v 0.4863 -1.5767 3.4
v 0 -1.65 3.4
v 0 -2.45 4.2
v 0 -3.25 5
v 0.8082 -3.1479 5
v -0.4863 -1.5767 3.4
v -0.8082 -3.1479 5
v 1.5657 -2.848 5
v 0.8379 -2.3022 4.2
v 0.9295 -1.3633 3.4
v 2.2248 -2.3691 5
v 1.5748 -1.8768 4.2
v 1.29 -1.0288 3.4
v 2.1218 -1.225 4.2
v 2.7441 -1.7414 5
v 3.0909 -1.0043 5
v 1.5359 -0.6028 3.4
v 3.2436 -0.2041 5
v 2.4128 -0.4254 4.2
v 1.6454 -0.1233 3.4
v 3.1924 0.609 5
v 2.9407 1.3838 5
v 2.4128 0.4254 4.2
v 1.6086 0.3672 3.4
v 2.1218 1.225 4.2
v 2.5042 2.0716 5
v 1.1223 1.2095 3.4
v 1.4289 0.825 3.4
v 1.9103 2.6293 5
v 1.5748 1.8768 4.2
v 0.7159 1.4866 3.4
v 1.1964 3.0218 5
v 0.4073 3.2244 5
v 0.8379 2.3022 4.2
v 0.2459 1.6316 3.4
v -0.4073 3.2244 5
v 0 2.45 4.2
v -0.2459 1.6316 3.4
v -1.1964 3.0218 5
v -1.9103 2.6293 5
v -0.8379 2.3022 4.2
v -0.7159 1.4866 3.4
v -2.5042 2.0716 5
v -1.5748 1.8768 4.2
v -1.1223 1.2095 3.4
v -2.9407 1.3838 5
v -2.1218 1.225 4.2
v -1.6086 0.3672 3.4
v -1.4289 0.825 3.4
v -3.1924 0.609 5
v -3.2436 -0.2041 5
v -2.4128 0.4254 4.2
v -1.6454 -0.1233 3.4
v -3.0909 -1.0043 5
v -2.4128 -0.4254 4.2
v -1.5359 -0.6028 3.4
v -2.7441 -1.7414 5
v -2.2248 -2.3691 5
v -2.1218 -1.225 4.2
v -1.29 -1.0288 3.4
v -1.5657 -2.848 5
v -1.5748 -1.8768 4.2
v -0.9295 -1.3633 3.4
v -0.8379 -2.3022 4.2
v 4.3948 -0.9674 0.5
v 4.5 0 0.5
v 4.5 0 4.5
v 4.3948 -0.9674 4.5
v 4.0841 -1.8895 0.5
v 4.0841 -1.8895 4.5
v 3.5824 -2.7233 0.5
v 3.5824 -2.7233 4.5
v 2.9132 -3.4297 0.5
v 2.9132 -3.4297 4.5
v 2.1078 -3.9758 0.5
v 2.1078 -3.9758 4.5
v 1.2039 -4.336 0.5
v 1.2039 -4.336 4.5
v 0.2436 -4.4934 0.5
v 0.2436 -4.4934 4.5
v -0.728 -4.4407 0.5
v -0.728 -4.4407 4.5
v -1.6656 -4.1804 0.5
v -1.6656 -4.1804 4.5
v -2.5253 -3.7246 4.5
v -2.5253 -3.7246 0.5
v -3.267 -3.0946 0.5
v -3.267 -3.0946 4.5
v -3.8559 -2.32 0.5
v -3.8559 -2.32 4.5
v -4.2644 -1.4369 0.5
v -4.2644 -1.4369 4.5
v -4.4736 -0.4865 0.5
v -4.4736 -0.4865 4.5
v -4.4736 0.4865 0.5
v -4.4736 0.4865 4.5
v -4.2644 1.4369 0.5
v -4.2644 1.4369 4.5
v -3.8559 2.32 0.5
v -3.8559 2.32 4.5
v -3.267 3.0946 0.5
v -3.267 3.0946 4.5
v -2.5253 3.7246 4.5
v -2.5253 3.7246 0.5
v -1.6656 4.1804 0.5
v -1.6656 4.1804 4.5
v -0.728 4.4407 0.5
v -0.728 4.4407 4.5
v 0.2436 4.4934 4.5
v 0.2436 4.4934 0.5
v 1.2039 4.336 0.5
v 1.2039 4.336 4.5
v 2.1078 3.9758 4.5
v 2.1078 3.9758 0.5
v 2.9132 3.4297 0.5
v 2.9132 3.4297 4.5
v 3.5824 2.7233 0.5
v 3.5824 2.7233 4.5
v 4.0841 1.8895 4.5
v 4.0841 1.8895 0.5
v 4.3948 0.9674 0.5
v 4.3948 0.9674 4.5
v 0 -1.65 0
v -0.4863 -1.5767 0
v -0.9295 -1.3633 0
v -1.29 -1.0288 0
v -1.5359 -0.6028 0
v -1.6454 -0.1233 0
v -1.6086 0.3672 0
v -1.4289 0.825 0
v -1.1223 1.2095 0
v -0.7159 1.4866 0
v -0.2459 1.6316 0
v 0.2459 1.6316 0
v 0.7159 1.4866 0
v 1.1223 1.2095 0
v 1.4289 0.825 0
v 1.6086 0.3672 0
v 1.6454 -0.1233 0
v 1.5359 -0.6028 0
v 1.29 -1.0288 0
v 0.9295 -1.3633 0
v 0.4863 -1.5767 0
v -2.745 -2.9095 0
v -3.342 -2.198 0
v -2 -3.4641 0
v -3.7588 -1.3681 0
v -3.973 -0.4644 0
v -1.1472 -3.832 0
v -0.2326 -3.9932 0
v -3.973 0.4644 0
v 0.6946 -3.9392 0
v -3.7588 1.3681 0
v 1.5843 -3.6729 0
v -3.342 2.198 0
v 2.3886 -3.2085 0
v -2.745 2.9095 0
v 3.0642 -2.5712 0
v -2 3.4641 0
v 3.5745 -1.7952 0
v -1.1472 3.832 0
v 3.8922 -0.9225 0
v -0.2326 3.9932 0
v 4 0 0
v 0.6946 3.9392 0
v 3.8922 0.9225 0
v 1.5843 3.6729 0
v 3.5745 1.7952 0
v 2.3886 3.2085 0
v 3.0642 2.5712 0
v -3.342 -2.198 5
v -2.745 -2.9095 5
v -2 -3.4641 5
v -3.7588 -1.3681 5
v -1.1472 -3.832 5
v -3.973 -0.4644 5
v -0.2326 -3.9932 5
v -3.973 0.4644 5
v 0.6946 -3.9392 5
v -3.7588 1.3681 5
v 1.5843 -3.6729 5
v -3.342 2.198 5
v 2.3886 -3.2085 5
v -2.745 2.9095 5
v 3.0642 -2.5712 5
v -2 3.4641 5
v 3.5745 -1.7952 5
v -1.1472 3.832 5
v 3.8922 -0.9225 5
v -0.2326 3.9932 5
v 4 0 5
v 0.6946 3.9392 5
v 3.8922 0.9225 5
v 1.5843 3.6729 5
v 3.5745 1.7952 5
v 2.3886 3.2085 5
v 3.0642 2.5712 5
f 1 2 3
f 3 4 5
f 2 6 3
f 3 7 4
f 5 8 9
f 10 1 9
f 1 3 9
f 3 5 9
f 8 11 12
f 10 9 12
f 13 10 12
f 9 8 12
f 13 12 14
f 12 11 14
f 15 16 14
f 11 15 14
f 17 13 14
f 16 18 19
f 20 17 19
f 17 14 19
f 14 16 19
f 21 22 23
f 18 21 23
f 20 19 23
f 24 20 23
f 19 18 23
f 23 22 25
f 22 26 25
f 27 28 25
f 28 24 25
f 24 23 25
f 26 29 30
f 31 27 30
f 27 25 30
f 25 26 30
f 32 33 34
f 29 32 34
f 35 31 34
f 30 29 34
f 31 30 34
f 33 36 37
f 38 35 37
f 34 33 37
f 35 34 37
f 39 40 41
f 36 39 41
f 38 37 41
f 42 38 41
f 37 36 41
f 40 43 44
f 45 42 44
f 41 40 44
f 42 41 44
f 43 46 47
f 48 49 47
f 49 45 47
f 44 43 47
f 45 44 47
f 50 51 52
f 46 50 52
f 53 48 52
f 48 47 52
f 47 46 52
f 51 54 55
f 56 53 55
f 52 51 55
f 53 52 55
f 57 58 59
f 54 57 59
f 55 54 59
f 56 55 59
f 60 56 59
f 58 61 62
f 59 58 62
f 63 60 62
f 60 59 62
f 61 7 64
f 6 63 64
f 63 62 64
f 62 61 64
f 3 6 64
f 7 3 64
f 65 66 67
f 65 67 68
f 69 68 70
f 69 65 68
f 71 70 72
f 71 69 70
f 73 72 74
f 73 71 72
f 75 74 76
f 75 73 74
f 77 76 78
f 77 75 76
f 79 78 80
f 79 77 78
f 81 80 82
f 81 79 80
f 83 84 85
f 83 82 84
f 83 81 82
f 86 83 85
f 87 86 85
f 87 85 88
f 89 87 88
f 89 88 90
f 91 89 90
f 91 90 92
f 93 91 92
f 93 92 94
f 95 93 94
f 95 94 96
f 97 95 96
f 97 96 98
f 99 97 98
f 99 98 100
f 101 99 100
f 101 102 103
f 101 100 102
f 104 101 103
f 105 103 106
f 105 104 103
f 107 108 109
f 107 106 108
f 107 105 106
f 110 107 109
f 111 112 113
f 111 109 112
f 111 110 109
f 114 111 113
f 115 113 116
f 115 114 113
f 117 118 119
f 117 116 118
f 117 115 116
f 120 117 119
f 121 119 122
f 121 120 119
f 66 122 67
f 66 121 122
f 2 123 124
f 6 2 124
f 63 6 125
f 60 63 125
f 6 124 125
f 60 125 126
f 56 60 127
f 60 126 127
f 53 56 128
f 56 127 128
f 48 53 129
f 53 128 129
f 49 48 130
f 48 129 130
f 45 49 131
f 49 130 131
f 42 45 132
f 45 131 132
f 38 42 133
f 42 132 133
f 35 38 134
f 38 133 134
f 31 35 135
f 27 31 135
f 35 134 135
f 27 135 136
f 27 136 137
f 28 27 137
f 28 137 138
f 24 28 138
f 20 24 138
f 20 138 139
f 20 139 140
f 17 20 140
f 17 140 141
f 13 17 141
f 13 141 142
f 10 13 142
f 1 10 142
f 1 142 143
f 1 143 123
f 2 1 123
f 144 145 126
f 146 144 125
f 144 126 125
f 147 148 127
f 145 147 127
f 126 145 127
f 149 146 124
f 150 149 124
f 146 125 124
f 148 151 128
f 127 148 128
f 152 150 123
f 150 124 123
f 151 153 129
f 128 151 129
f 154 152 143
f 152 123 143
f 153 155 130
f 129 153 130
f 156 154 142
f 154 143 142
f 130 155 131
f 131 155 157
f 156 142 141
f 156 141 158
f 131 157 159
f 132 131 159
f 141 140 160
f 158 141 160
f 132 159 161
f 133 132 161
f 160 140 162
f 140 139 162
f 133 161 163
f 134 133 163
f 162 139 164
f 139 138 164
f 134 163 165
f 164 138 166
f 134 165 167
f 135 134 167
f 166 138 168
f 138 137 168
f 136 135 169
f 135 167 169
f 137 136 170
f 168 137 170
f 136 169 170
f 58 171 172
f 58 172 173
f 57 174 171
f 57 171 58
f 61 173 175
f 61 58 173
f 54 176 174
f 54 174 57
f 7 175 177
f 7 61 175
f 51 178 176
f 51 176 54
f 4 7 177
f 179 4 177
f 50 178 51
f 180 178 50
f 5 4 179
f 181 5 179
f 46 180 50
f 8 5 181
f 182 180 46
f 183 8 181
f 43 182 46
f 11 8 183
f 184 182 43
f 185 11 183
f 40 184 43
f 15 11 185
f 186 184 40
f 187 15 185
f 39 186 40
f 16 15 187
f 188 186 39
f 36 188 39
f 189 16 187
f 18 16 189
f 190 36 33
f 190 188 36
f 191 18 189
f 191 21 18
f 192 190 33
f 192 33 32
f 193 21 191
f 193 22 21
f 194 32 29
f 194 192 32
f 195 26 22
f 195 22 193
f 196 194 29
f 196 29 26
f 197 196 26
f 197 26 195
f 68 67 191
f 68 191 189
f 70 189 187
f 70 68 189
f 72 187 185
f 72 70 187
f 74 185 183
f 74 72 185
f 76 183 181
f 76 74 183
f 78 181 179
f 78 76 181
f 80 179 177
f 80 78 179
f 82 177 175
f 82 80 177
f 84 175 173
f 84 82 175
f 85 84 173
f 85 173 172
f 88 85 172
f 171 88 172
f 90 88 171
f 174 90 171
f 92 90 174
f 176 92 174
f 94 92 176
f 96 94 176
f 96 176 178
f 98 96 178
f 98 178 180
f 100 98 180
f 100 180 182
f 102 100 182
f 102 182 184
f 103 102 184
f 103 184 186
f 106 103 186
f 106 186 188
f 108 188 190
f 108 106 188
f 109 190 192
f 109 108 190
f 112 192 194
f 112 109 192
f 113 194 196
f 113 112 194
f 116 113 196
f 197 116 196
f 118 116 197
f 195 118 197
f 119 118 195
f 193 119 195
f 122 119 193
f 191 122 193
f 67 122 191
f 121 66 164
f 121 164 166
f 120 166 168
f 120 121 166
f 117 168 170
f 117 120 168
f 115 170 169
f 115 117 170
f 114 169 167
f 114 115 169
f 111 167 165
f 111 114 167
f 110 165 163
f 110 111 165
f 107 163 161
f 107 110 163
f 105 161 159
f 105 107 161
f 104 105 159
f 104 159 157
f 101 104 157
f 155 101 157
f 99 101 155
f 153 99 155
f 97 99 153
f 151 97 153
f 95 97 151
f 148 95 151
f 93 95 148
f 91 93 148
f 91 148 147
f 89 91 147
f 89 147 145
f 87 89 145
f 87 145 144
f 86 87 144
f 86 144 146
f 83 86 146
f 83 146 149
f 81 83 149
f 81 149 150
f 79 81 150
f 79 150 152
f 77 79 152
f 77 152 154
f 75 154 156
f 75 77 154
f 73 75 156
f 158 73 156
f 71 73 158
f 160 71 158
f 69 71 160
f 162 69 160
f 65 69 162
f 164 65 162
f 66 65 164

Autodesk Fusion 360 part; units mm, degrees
sketch "Sketch1" plane through (0, 0, 0) normal (0, 0, 1) x (1, 0, 0)
  circle A0 centre (0, 0) radius 4.5
  circle A1 centre (0, 0) radius 1.5
  dimension "d1" = 9
  dimension "d4" = 3
extrude "Extrude1" add sketch "Sketch1" along normal blind 5
hole "Hole1" at (0, 0, 5) direction (0, 0, -1) diameter 3.3 depth 10 tip angle 118 countersink diameter 6.5 countersink angle 90
chamfer "Chamfer1" distance 0.5 angle 45 2 edges at (-4.1955, -1.6273, 5) (-4.1955, -1.6273, 0)
